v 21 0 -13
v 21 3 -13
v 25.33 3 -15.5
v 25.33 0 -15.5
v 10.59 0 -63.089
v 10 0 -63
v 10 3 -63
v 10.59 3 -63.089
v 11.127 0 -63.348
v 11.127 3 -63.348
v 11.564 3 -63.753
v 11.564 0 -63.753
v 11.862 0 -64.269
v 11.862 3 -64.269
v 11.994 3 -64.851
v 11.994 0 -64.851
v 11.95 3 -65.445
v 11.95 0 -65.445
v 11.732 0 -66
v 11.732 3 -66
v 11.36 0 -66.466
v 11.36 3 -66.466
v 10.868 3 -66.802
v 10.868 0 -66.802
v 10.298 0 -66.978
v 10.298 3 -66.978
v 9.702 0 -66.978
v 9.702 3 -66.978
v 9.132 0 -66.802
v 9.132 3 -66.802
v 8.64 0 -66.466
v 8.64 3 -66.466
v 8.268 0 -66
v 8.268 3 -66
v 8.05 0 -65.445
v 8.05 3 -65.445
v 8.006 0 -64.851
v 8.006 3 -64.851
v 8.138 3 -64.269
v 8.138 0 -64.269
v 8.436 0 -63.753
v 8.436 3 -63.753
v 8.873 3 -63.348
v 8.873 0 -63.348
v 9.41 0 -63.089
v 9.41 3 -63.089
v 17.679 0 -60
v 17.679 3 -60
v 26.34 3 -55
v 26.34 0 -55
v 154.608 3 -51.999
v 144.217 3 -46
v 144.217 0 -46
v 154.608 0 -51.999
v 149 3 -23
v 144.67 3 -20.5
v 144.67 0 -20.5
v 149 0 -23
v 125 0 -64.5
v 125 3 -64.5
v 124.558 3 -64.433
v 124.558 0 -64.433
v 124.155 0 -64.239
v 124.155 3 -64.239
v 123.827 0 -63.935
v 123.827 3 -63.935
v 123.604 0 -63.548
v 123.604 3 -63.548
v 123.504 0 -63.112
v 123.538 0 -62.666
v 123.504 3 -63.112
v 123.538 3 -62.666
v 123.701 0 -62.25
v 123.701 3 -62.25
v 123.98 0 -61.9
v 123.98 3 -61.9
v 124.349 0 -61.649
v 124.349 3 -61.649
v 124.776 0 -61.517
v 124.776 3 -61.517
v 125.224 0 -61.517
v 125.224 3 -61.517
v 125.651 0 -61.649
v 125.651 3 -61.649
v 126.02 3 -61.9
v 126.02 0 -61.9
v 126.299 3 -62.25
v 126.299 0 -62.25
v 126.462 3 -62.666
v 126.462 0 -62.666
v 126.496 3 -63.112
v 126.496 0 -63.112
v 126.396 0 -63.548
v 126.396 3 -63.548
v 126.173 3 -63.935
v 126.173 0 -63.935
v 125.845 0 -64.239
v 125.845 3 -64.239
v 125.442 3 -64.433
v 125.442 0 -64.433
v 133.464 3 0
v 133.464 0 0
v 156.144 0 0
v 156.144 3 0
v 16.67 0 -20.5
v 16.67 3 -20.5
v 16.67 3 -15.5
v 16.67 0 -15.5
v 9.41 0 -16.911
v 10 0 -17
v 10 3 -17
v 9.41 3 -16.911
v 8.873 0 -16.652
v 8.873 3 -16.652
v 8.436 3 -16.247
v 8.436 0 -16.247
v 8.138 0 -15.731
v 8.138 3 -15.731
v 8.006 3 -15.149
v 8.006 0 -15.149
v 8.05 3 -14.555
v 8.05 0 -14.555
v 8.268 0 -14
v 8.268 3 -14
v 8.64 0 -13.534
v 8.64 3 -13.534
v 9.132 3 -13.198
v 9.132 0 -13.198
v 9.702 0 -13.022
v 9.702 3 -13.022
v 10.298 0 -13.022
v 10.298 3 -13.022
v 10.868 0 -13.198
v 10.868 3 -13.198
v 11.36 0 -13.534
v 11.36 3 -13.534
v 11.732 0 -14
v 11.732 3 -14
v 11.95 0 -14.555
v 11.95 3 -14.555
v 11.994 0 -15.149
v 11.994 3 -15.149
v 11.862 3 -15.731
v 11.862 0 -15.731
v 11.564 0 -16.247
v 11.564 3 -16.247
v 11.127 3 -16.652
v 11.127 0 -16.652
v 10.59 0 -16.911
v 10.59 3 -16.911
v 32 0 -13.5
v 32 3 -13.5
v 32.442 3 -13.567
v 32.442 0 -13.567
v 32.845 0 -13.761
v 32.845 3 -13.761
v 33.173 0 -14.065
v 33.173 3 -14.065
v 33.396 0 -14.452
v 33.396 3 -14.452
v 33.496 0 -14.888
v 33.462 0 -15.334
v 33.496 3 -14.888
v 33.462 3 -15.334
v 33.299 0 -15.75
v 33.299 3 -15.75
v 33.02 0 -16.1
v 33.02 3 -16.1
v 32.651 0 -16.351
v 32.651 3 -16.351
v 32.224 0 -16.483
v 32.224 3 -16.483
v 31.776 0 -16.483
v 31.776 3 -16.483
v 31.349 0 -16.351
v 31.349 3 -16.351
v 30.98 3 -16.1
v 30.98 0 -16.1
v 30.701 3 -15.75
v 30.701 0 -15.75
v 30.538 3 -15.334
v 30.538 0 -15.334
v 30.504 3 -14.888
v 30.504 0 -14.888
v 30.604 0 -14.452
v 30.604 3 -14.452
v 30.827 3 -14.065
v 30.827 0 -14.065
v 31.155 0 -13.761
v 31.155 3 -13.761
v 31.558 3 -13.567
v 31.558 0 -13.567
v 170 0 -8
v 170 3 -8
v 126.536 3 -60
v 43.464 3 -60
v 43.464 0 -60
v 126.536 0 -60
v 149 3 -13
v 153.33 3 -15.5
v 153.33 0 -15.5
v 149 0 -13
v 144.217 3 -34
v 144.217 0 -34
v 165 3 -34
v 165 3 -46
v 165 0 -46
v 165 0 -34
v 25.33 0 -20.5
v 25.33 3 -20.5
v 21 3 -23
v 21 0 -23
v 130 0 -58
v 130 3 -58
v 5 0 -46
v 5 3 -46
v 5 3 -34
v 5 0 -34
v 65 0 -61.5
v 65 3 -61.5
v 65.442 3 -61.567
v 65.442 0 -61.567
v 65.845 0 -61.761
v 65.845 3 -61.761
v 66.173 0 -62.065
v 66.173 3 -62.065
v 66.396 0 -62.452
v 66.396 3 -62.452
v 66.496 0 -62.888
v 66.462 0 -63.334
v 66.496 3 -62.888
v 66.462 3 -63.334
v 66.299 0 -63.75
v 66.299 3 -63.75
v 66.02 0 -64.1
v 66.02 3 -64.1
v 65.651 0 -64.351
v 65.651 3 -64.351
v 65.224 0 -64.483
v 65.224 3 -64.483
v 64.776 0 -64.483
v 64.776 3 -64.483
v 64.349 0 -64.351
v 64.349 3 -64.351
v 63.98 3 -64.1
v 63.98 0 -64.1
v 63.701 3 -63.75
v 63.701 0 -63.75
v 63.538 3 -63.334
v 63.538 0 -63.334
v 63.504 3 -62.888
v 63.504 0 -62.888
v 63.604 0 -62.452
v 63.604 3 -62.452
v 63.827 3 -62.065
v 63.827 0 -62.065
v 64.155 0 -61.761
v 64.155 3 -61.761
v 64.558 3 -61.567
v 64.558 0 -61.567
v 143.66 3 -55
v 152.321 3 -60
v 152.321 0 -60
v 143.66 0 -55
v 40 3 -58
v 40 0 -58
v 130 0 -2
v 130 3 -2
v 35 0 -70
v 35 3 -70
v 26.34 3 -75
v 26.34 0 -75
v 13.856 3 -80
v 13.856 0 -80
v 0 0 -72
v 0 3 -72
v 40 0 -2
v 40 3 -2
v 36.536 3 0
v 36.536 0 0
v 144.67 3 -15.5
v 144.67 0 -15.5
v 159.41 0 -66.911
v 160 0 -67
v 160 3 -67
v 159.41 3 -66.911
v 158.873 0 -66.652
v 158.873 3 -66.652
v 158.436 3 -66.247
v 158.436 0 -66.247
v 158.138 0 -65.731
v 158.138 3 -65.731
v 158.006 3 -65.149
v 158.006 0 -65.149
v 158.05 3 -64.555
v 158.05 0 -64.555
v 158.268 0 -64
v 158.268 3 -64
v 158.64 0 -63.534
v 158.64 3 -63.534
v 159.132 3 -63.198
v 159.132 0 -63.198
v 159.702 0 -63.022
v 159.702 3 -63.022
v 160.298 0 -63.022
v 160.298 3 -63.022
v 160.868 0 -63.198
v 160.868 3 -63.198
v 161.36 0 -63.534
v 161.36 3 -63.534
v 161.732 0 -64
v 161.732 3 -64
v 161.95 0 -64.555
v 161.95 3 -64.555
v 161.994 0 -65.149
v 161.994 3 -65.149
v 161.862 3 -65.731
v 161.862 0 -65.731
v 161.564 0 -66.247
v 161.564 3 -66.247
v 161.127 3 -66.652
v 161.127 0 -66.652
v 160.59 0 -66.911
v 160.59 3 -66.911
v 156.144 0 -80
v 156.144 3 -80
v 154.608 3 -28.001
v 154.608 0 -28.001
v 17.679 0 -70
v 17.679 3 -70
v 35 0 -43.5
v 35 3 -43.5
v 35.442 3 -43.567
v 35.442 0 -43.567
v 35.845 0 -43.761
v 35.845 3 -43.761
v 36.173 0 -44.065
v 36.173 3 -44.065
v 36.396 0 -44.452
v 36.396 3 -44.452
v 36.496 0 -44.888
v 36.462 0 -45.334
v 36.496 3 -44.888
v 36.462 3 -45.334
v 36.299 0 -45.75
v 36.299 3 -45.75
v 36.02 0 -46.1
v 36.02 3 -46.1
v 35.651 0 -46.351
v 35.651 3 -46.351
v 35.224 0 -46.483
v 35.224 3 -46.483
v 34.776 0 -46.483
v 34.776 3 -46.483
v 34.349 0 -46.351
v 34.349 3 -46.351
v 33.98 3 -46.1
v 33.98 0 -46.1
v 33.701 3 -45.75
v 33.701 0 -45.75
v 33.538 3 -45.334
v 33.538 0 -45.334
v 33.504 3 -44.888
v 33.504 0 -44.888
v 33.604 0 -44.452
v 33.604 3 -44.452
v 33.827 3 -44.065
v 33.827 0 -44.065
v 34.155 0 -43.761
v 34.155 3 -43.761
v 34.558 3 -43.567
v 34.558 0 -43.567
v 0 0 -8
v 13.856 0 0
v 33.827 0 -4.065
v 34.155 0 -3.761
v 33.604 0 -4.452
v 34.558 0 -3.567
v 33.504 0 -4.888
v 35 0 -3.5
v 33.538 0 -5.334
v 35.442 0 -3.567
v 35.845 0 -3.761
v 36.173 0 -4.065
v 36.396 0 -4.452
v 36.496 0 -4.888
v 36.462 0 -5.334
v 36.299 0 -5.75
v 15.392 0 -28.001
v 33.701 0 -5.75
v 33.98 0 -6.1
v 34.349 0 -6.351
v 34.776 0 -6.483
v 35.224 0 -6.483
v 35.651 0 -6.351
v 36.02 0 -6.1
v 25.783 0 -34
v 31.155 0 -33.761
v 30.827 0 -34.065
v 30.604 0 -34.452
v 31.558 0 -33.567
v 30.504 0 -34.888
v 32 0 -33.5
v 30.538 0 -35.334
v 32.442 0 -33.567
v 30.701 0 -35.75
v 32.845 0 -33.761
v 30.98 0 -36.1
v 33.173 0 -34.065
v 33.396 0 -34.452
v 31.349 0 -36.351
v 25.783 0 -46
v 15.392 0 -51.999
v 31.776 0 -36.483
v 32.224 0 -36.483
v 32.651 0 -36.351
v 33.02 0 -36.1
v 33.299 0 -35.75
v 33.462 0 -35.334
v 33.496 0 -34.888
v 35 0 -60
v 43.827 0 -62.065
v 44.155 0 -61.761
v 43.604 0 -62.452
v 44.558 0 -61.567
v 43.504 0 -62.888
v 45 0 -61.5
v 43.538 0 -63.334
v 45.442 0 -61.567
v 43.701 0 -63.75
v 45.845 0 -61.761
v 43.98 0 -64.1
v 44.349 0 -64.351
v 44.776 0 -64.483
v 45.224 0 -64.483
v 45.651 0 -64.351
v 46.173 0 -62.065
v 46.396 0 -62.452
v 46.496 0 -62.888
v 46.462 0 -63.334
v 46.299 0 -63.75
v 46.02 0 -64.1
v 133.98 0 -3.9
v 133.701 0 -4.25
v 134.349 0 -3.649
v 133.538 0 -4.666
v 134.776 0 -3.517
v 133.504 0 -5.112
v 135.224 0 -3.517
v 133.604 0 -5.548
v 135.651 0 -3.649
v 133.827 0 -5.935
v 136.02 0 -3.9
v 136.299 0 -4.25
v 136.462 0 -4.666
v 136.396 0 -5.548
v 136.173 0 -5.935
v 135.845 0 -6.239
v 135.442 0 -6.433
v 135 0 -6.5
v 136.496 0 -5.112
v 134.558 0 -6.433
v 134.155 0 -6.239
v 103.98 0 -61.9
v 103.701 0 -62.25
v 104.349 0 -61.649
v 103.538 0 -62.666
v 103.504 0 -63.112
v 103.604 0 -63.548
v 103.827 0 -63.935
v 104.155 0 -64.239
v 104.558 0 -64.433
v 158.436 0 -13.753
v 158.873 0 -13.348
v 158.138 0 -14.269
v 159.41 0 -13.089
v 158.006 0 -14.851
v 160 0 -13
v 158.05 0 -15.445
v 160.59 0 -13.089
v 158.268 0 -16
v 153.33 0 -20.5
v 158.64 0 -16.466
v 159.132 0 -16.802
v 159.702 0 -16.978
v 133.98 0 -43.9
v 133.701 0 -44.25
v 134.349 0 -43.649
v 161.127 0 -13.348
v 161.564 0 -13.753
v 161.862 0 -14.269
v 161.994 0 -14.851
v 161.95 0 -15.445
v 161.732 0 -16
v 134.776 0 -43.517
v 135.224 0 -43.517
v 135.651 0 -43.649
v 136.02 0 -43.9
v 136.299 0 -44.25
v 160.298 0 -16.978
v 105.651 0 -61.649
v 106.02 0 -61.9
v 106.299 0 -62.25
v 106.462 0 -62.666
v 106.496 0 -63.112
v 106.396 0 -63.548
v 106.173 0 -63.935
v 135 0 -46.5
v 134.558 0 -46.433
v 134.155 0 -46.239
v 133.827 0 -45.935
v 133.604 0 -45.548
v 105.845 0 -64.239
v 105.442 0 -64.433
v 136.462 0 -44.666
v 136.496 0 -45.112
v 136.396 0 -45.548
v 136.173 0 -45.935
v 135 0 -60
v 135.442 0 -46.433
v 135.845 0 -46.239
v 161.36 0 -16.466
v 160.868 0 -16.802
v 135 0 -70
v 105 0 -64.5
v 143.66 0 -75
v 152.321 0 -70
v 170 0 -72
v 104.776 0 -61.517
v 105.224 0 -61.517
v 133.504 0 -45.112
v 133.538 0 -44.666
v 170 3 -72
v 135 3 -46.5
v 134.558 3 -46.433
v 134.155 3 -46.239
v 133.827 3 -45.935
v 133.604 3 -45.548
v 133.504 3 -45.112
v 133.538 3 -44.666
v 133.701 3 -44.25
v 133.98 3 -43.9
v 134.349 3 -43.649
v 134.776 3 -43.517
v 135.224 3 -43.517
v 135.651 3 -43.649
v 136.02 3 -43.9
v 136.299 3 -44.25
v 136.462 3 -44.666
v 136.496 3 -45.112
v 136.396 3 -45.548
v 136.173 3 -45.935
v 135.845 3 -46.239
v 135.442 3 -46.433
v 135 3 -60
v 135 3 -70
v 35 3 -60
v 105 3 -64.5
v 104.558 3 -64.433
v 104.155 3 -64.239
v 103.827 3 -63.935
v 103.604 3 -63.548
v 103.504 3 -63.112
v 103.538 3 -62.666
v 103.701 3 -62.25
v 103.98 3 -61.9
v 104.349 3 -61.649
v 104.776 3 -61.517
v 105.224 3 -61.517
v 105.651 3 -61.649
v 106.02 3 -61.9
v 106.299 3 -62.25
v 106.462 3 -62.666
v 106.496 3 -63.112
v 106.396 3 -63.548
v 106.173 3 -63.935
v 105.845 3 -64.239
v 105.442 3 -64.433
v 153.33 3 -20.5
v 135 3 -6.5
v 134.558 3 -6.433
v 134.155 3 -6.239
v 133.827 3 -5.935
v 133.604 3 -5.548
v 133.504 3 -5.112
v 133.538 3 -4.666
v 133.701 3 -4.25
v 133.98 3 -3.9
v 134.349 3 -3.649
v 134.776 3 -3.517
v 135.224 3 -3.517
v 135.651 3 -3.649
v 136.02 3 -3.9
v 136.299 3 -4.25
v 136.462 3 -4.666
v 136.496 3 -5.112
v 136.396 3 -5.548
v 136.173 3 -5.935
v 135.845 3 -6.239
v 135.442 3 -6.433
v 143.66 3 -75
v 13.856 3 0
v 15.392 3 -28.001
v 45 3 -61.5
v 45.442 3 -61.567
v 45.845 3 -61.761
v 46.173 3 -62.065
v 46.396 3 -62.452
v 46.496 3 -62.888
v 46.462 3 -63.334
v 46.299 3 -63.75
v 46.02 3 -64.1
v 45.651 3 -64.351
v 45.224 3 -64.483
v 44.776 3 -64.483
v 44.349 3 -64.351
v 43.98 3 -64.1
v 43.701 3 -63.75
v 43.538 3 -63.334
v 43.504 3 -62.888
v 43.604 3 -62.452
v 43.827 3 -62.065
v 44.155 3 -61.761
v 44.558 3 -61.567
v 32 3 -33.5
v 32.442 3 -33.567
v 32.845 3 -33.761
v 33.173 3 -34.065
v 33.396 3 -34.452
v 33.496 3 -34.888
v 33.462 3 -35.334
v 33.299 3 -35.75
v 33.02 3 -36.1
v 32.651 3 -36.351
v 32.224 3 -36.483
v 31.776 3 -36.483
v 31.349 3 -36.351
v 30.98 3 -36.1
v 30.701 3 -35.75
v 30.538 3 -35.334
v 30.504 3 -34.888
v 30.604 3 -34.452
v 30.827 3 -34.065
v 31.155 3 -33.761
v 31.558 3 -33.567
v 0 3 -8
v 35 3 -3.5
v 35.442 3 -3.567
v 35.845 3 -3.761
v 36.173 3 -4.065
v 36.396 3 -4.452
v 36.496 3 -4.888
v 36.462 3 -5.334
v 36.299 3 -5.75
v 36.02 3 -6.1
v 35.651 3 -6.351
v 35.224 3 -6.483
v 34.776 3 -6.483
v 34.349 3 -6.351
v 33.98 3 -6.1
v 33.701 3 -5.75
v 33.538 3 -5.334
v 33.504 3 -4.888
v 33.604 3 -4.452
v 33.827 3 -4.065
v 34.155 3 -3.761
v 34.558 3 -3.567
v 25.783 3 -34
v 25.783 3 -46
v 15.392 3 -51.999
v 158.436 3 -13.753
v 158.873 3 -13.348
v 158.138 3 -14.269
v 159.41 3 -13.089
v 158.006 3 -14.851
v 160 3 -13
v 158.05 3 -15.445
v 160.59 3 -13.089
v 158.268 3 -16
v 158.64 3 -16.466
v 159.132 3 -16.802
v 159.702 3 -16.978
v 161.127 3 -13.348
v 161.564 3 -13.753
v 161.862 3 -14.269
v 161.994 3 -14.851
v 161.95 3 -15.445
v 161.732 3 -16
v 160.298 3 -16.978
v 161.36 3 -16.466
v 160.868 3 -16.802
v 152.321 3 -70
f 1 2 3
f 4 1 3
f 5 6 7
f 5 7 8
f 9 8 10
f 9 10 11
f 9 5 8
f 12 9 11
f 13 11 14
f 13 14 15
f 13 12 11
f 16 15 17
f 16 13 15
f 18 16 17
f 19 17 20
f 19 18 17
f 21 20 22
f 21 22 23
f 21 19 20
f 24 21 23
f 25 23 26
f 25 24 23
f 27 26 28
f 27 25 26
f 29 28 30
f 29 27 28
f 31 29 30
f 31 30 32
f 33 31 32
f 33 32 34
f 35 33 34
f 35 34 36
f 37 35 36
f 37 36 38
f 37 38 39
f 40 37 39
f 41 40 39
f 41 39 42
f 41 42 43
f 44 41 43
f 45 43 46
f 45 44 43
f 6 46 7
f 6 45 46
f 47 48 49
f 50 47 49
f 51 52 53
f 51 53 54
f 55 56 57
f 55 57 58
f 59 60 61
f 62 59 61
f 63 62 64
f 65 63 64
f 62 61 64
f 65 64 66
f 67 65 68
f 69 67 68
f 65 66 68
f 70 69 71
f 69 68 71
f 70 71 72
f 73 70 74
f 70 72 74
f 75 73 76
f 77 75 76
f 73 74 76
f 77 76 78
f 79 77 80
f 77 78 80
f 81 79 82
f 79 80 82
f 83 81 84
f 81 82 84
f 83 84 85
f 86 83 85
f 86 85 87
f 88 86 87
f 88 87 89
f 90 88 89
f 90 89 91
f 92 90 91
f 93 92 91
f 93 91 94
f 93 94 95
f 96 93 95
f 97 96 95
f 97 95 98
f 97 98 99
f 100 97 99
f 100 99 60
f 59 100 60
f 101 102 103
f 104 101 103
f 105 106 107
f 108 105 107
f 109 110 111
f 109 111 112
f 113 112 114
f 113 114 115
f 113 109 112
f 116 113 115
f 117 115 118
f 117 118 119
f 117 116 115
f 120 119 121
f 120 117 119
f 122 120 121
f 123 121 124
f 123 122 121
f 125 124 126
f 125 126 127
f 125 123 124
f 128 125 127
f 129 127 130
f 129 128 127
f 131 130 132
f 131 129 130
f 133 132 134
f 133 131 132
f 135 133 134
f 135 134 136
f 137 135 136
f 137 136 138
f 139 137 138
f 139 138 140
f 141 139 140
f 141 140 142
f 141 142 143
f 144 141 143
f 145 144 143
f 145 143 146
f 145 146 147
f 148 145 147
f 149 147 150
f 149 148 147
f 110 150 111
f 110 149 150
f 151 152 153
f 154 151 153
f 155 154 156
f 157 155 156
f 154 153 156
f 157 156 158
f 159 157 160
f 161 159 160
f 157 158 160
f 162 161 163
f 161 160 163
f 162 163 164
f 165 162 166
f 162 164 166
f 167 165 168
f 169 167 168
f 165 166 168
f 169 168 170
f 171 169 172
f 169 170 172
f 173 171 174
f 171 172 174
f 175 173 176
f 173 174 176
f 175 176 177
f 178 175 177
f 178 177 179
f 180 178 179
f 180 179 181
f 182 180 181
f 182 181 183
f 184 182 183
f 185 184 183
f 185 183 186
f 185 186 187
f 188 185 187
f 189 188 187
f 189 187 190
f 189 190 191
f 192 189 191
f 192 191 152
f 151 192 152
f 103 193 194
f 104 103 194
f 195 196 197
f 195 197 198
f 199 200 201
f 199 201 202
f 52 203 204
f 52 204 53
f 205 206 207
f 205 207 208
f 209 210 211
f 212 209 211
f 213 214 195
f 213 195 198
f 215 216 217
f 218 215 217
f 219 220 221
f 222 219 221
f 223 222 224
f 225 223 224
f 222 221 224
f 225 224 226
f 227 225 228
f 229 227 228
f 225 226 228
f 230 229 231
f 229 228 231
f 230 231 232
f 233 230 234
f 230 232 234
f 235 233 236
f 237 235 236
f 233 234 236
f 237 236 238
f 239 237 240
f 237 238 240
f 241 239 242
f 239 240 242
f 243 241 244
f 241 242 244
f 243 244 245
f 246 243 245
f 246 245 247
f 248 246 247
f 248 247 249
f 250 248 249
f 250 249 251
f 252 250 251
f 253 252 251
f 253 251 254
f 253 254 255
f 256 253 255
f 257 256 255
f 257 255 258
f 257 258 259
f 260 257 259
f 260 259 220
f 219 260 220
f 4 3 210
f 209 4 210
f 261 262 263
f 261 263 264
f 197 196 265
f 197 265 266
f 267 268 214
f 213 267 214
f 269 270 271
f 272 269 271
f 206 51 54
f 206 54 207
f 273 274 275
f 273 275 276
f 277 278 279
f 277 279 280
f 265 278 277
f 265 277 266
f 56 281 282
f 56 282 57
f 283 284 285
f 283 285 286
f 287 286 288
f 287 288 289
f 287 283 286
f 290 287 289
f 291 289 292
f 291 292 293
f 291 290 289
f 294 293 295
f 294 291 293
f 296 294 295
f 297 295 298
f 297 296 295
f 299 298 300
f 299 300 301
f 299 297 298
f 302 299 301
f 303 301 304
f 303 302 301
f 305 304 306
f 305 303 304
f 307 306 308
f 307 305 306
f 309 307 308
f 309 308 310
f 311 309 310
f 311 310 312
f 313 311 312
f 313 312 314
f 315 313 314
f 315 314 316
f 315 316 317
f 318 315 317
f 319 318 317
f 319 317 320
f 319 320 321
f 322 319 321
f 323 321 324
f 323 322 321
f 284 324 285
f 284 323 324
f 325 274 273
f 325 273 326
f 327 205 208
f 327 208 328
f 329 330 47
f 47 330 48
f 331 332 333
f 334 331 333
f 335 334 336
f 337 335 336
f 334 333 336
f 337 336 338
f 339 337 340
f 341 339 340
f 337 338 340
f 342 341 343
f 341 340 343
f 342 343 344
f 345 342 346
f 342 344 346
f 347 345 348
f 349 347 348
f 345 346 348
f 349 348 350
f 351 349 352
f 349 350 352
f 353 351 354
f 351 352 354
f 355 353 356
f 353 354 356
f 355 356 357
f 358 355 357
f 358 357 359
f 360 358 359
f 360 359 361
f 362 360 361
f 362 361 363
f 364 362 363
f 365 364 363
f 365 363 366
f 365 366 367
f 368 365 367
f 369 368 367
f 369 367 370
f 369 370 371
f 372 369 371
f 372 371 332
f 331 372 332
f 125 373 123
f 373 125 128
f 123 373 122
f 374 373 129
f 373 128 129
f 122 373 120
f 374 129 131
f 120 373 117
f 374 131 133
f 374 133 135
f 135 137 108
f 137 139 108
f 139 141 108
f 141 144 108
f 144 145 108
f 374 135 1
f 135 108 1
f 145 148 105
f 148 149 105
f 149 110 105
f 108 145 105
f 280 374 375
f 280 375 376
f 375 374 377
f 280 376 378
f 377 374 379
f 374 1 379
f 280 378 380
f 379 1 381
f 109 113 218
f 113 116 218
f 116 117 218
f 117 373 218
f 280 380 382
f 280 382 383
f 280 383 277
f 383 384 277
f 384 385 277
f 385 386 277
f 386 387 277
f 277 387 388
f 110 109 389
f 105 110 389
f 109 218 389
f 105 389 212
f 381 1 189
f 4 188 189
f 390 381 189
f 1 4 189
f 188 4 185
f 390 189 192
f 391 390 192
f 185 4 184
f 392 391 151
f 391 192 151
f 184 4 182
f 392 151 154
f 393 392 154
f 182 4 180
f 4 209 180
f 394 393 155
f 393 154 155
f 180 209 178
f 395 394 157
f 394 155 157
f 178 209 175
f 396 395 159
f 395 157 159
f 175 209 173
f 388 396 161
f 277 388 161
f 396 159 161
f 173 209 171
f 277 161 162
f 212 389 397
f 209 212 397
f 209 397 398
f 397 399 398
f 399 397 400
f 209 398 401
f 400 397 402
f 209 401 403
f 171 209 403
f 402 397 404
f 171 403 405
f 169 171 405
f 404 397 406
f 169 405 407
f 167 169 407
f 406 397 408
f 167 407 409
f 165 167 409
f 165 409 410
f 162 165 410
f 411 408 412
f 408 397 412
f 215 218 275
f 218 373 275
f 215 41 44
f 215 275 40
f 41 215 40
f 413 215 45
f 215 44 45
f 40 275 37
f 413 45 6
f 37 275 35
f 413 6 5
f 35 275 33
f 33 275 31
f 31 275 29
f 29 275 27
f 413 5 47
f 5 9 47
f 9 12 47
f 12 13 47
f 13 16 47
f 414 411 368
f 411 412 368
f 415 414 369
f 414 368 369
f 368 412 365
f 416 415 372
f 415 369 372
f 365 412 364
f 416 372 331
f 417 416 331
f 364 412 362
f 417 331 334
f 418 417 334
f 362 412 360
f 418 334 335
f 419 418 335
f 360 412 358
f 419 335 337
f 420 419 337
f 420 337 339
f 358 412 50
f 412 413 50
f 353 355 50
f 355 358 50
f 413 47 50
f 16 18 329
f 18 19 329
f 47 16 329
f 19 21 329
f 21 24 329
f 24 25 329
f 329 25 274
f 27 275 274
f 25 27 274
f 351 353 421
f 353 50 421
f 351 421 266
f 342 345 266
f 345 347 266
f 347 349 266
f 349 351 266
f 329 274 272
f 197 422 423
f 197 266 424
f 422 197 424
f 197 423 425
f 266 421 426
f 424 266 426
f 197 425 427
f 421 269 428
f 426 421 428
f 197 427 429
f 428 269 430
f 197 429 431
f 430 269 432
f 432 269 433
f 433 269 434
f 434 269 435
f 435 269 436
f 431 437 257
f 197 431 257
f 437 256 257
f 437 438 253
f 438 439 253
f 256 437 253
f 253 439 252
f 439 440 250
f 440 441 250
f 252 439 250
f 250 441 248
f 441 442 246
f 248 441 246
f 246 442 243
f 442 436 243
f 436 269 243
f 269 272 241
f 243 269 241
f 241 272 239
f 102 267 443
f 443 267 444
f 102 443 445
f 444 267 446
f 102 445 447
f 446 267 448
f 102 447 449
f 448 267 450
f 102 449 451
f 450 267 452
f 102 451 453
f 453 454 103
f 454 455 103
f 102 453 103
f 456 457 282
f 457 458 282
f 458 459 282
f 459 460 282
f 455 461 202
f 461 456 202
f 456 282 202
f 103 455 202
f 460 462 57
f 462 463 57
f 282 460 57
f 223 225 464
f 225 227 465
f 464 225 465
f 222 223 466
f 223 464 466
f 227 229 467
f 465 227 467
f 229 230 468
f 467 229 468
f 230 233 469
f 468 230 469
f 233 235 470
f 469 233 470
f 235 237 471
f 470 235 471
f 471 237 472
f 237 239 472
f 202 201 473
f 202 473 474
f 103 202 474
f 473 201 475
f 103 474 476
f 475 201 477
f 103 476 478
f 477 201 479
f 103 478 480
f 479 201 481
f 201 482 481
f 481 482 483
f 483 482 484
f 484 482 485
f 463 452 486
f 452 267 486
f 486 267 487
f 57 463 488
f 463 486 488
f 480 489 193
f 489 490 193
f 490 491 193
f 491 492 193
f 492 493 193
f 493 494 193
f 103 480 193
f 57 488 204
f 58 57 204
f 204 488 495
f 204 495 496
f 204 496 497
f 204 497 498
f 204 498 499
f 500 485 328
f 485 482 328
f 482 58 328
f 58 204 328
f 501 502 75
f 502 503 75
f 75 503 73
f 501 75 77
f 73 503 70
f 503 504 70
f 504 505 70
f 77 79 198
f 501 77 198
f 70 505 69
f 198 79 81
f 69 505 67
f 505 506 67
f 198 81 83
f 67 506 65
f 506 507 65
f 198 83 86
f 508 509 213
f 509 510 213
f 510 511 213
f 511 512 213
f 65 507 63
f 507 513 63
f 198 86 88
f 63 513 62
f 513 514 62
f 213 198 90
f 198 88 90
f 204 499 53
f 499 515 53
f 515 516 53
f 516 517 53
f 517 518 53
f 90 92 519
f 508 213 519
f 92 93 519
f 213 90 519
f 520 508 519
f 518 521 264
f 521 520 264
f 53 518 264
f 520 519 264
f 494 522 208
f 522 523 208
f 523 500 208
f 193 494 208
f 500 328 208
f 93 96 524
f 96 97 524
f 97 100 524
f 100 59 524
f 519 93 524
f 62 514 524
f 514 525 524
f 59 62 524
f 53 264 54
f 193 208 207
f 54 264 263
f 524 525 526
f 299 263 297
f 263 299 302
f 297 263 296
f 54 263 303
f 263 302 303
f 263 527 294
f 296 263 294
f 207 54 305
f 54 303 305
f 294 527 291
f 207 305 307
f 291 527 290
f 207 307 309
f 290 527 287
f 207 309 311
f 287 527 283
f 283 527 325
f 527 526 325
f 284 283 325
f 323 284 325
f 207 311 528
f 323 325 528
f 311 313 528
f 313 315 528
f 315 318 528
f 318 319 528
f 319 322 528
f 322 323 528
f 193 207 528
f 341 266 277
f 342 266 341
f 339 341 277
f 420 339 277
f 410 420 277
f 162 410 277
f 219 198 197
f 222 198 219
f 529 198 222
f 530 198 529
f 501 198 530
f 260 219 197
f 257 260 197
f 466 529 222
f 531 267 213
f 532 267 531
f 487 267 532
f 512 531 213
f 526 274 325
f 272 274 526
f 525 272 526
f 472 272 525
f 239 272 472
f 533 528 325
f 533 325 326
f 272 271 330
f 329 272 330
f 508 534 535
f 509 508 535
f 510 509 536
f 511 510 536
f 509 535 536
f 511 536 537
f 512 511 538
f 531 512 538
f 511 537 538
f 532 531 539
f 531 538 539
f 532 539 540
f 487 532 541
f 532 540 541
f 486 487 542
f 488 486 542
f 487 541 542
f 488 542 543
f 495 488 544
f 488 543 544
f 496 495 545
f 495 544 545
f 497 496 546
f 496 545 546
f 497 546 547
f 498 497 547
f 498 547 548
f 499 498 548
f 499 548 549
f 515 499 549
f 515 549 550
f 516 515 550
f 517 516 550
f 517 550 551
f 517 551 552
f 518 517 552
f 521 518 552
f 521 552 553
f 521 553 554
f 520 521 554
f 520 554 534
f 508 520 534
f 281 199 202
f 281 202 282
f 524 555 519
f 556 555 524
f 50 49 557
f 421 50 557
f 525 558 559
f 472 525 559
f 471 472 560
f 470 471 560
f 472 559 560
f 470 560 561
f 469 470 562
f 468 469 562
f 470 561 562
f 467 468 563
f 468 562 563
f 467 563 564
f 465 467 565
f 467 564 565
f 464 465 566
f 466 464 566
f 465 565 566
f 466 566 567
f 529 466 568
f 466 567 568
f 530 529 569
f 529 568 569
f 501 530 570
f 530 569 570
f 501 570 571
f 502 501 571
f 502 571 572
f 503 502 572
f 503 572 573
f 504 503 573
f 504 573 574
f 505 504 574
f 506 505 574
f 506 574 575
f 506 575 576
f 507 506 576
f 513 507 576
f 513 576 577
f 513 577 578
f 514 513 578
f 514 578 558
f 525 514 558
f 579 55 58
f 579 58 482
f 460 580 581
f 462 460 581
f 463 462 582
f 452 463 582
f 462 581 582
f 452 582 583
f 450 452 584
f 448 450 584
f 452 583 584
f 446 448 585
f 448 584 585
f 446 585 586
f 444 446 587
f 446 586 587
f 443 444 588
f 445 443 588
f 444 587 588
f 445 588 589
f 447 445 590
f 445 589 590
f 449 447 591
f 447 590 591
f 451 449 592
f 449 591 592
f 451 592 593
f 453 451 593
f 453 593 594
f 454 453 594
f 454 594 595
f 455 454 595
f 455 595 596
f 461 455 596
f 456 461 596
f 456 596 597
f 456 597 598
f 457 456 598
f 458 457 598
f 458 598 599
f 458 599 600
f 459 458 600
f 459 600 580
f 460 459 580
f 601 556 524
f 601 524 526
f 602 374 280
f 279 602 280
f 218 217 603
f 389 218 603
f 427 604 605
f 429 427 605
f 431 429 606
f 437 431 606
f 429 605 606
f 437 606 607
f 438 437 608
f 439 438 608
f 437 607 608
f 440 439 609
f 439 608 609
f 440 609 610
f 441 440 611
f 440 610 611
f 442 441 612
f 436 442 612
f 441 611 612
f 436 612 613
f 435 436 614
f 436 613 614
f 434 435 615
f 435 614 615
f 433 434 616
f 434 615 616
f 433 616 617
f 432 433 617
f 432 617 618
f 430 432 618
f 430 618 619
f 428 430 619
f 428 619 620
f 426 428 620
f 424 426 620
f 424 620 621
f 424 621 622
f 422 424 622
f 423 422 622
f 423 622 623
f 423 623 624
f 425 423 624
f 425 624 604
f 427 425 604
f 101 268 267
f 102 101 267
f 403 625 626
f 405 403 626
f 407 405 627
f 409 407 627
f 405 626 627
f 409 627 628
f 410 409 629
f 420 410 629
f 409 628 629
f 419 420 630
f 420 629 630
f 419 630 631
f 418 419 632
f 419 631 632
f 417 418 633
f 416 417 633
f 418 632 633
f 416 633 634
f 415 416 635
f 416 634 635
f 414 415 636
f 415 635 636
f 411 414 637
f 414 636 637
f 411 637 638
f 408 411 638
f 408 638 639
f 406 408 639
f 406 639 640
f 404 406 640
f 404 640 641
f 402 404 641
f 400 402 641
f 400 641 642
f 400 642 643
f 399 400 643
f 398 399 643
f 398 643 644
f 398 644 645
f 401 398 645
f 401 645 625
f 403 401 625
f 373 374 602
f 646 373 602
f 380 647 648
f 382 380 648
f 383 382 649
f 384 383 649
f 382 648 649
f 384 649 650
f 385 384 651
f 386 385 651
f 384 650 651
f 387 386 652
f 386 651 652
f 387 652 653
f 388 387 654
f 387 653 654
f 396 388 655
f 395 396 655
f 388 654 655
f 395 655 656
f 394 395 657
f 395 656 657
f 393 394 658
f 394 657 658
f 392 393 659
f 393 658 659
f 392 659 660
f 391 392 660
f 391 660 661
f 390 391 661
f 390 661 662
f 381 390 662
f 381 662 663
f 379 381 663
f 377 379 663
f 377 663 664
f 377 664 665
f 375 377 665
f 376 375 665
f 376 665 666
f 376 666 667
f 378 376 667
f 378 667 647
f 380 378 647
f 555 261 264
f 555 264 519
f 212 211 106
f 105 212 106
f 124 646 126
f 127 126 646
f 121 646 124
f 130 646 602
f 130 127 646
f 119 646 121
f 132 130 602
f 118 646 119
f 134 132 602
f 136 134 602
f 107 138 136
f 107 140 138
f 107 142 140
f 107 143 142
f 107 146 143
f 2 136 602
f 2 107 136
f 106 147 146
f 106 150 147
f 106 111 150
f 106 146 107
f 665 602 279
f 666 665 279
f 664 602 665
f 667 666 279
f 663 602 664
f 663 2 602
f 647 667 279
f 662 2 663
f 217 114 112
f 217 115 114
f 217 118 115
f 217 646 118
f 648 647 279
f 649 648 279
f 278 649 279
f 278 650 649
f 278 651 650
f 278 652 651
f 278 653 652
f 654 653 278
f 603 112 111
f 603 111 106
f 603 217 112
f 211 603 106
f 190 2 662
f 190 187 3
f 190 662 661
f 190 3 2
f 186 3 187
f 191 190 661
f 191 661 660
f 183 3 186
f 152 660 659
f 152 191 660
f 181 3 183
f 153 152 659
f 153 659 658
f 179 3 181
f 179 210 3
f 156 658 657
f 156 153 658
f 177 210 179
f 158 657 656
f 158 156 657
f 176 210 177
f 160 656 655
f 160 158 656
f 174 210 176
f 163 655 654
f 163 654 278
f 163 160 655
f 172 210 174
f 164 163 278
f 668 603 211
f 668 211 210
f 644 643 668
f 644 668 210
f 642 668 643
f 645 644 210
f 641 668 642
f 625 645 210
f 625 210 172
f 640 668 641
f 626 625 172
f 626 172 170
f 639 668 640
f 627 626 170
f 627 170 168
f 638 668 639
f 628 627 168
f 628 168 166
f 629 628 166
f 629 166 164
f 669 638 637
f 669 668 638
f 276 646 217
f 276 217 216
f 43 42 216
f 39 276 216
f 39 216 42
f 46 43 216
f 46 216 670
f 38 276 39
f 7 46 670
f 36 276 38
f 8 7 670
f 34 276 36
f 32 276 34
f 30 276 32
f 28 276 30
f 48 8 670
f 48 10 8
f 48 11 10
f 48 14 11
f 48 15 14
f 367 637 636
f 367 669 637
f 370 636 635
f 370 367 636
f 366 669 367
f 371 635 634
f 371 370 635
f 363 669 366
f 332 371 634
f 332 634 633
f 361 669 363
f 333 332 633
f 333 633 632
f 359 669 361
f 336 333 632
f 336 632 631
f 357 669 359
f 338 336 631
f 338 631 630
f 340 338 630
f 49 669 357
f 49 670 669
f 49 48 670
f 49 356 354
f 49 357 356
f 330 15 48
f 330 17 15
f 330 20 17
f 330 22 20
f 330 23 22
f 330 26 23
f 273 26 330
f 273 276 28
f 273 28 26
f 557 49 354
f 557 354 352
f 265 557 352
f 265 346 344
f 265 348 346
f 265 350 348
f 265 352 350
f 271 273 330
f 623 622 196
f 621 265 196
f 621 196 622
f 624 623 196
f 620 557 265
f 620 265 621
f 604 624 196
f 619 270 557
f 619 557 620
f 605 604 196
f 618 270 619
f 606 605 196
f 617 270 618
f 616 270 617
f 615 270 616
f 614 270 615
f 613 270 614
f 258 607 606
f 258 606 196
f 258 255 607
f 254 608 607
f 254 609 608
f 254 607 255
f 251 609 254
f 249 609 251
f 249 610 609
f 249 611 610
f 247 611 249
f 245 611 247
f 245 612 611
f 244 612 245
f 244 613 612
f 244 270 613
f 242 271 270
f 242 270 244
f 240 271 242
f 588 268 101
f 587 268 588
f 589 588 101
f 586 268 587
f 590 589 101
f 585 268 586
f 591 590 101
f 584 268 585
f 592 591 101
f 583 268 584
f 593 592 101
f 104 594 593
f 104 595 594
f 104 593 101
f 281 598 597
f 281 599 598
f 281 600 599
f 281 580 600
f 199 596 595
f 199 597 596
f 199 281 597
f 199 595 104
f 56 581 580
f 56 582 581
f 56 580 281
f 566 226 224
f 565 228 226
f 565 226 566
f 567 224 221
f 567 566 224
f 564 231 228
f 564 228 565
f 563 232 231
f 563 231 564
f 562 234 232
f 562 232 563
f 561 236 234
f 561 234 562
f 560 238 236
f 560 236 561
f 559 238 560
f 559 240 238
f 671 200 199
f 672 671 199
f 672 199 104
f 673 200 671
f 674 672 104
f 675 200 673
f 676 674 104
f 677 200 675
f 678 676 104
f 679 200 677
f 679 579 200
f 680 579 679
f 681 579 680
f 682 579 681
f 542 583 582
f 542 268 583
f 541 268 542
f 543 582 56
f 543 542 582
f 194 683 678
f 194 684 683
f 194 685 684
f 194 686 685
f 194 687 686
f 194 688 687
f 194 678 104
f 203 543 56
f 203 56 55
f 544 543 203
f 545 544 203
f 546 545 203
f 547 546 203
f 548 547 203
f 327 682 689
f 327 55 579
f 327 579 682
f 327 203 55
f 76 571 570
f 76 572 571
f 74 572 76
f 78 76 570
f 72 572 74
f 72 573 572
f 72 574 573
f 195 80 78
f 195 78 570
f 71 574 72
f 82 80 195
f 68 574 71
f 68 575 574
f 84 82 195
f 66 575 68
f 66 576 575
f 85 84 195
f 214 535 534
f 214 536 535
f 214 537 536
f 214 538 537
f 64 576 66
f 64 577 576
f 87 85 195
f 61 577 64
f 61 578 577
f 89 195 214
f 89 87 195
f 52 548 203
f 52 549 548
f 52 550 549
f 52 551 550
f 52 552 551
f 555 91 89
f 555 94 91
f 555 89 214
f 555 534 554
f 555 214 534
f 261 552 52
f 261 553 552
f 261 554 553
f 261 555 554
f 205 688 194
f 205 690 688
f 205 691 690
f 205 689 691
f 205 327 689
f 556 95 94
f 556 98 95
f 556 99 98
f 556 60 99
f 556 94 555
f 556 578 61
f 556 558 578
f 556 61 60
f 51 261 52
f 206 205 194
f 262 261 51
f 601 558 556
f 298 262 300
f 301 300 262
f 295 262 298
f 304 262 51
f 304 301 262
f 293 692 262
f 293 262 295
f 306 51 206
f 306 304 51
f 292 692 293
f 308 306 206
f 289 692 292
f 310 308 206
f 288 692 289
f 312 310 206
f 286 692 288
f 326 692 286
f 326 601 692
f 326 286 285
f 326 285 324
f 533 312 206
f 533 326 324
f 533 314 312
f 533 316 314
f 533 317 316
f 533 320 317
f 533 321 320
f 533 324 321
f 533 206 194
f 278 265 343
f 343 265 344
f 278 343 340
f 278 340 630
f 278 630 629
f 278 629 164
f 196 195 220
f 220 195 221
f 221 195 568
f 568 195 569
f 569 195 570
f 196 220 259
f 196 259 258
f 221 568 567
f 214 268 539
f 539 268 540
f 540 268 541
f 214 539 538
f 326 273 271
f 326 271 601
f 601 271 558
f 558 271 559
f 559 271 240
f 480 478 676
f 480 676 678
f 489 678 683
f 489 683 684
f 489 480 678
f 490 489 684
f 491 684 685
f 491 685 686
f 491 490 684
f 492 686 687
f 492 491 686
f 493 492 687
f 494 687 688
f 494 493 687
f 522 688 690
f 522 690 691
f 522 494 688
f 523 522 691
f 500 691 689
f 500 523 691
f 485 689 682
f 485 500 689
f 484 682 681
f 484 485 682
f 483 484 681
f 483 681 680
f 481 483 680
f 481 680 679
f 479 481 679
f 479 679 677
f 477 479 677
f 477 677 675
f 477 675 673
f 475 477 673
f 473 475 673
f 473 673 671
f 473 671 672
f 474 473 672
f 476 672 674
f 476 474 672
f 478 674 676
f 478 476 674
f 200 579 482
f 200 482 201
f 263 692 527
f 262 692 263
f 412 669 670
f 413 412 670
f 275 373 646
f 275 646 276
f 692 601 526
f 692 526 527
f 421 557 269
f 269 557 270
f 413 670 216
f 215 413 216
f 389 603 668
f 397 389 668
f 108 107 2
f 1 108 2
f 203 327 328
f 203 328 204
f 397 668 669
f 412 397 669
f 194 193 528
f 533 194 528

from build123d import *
from OCP.BRepFilletAPI import BRepFilletAPI_MakeChamfer

# Parameters (mm, degrees)
SKETCH_1_W          = 170
SKETCH_1_H          = 80
SKETCH_1_R          = 2
EXTRUDE_1_DEPTH     = 3
SKETCH_2_R          = 1.5
SKETCH_2_W          = 90
SKETCH_2_H          = 60
CUT_EXTRUDE_1_DEPTH = 188.906891837
SKETCH_3_R          = 1.5
CUT_EXTRUDE_2_DEPTH = 5
CUT_EXTRUDE_3_DEPTH = 10
CHAMFER_1_SIZE      = 2
CHAMFER_1_SIZE2     = 3.464101615
CHAMFER_2_SIZE      = 8
CHAMFER_2_SIZE2     = 13.856406461


with BuildPart() as part:
    # 草图1 → 凸台-拉伸1 (new body)
    with BuildSketch(Plane(origin=(0, 0, 0), x_dir=(1, 0, 0), z_dir=(0, 1, 0))):
        with Locations((85, 40)):
            Rectangle(SKETCH_1_W, SKETCH_1_H)
        with Locations(Location((10, 65, 0), (0, 0, 270))):
            Circle(SKETCH_1_R, mode=Mode.SUBTRACT)
        with Locations(Location((10, 15, 0), (0, 0, 90))):
            Circle(SKETCH_1_R, mode=Mode.SUBTRACT)
        with Locations(Location((160, 15, 0), (0, 0, 270))):
            Circle(SKETCH_1_R, mode=Mode.SUBTRACT)
        with Locations(Location((160, 65, 0), (0, 0, 90))):
            Circle(SKETCH_1_R, mode=Mode.SUBTRACT)
    extrude(amount=EXTRUDE_1_DEPTH)

    # 草图2 → 切除-拉伸1 (cut, through all)
    with BuildSketch(Plane(origin=(0, 3, 0), x_dir=(1, 0, 0), z_dir=(0, 1, 0))):
        with Locations(Location((35, 45, 0), (0, 0, 270))):
            Circle(SKETCH_2_R)
        with Locations(Location((35, 5, 0), (0, 0, 270))):
            Circle(SKETCH_2_R)
        with Locations(Location((135, 5, 0), (0, 0, 90))):
            Circle(SKETCH_2_R)
        with Locations(Location((135, 45, 0), (0, 0, 90))):
            Circle(SKETCH_2_R)
        with Locations(Location((45, 63, 0), (0, 0, 270))):
            Circle(SKETCH_2_R)
        with Locations(Location((65, 63, 0), (0, 0, 270))):
            Circle(SKETCH_2_R)
        with Locations(Location((105, 63, 0), (0, 0, 90))):
            Circle(SKETCH_2_R)
        with Locations(Location((125, 63, 0), (0, 0, 90))):
            Circle(SKETCH_2_R)
        with Locations((85, 30)):
            Rectangle(SKETCH_2_W, SKETCH_2_H)
    extrude(amount=-CUT_EXTRUDE_1_DEPTH, mode=Mode.SUBTRACT)

    # 草图3 → 切除-拉伸2 (cut)
    with BuildSketch(Plane(origin=(0, 3, 0), x_dir=(1, 0, 0), z_dir=(0, 1, 0))):
        with Locations(Location((32, 15, 0), (0, 0, 270))):
            Circle(SKETCH_3_R)
        with Locations(Location((32, 35, 0), (0, 0, 270))):
            Circle(SKETCH_3_R)
    extrude(amount=-CUT_EXTRUDE_2_DEPTH, mode=Mode.SUBTRACT)

    # 草图5 → 切除-拉伸3 (cut)
    with BuildSketch(Plane(origin=(0, 3, 0), x_dir=(1, 0, 0), z_dir=(0, 1, 0))):
        Polygon((15.391630359, 28.000778829), (25.783260719, 34.000389415), (25.783260719, 45.999610585), (15.391630359, 51.999221171), (5, 45.999610585), (5, 34.000389415), align=None)
        Polygon((35, 60), (35, 70), (26.339745962, 75), (17.679491924, 70), (17.679491924, 60), (26.339745962, 55), align=None)
        Polygon((21, 13), (25.330127019, 15.5), (25.330127019, 20.5), (21, 23), (16.669872981, 20.5), (16.669872981, 15.5), align=None)
        Polygon((153.330127019, 15.5), (149, 13), (144.669872981, 15.5), (144.669872981, 20.5), (149, 23), (153.330127019, 20.5), align=None)
        Polygon((143.660254038, 55), (135, 60), (135, 70), (143.660254038, 75), (152.320508076, 70), (152.320508076, 60), align=None)
        Polygon((165, 34.000389415), (154.608369641, 28.000778829), (144.216739281, 34.000389415), (144.216739281, 45.999610585), (154.608369641, 51.999221171), (165, 45.999610585), align=None)
    extrude(amount=-CUT_EXTRUDE_3_DEPTH, mode=Mode.SUBTRACT)

    # 倒角1: one chamfer whose edges measure the first distance from different faces: ONE call of the kernel's chamfer builder (chamfer() names one face for all edges)
    chamfer_1_edges_1 = [part.edges().sort_by_distance(p)[0] for p in [
        (40, 1.5, 0),
        (40, 1.5, -60),
    ]]
    chamfer_1_side_1 = [part.faces().sort_by_distance(p)[0] for p in [
        (40, 1.5, -30),
    ]]
    chamfer_1_edges_2 = [part.edges().sort_by_distance(p)[0] for p in [
        (130, 1.5, -60),
        (130, 1.5, 0),
    ]]
    chamfer_1_side_2 = [part.faces().sort_by_distance(p)[0] for p in [
        (130, 1.5, -30),
    ]]
    chamfer_1 = BRepFilletAPI_MakeChamfer(part.part.solid().wrapped)
    for e in chamfer_1_edges_1:
        chamfer_1.Add(CHAMFER_1_SIZE, CHAMFER_1_SIZE2, e.wrapped, chamfer_1_side_1[0].wrapped)  # the first distance lies on this face
    for e in chamfer_1_edges_2:
        chamfer_1.Add(CHAMFER_1_SIZE, CHAMFER_1_SIZE2, e.wrapped, chamfer_1_side_2[0].wrapped)  # the first distance lies on this face
    add(Compound.cast(chamfer_1.Shape()), mode=Mode.REPLACE)

    # 倒角2: one chamfer whose edges measure the first distance from different faces: ONE call of the kernel's chamfer builder (chamfer() names one face for all edges)
    chamfer_2_edges_1 = [part.edges().sort_by_distance(p)[0] for p in [
        (0, 1.5, -80),
        (0, 1.5, 0),
    ]]
    chamfer_2_side_1 = [part.faces().sort_by_distance(p)[0] for p in [
        (0, 1.5, -40),
    ]]
    chamfer_2_edges_2 = [part.edges().sort_by_distance(p)[0] for p in [
        (170, 1.5, -80),
        (170, 1.5, 0),
    ]]
    chamfer_2_side_2 = [part.faces().sort_by_distance(p)[0] for p in [
        (170, 1.5, -40),
    ]]
    chamfer_2 = BRepFilletAPI_MakeChamfer(part.part.solid().wrapped)
    for e in chamfer_2_edges_1:
        chamfer_2.Add(CHAMFER_2_SIZE, CHAMFER_2_SIZE2, e.wrapped, chamfer_2_side_1[0].wrapped)  # the first distance lies on this face
    for e in chamfer_2_edges_2:
        chamfer_2.Add(CHAMFER_2_SIZE, CHAMFER_2_SIZE2, e.wrapped, chamfer_2_side_2[0].wrapped)  # the first distance lies on this face
    add(Compound.cast(chamfer_2.Shape()), mode=Mode.REPLACE)


solid = part.part
